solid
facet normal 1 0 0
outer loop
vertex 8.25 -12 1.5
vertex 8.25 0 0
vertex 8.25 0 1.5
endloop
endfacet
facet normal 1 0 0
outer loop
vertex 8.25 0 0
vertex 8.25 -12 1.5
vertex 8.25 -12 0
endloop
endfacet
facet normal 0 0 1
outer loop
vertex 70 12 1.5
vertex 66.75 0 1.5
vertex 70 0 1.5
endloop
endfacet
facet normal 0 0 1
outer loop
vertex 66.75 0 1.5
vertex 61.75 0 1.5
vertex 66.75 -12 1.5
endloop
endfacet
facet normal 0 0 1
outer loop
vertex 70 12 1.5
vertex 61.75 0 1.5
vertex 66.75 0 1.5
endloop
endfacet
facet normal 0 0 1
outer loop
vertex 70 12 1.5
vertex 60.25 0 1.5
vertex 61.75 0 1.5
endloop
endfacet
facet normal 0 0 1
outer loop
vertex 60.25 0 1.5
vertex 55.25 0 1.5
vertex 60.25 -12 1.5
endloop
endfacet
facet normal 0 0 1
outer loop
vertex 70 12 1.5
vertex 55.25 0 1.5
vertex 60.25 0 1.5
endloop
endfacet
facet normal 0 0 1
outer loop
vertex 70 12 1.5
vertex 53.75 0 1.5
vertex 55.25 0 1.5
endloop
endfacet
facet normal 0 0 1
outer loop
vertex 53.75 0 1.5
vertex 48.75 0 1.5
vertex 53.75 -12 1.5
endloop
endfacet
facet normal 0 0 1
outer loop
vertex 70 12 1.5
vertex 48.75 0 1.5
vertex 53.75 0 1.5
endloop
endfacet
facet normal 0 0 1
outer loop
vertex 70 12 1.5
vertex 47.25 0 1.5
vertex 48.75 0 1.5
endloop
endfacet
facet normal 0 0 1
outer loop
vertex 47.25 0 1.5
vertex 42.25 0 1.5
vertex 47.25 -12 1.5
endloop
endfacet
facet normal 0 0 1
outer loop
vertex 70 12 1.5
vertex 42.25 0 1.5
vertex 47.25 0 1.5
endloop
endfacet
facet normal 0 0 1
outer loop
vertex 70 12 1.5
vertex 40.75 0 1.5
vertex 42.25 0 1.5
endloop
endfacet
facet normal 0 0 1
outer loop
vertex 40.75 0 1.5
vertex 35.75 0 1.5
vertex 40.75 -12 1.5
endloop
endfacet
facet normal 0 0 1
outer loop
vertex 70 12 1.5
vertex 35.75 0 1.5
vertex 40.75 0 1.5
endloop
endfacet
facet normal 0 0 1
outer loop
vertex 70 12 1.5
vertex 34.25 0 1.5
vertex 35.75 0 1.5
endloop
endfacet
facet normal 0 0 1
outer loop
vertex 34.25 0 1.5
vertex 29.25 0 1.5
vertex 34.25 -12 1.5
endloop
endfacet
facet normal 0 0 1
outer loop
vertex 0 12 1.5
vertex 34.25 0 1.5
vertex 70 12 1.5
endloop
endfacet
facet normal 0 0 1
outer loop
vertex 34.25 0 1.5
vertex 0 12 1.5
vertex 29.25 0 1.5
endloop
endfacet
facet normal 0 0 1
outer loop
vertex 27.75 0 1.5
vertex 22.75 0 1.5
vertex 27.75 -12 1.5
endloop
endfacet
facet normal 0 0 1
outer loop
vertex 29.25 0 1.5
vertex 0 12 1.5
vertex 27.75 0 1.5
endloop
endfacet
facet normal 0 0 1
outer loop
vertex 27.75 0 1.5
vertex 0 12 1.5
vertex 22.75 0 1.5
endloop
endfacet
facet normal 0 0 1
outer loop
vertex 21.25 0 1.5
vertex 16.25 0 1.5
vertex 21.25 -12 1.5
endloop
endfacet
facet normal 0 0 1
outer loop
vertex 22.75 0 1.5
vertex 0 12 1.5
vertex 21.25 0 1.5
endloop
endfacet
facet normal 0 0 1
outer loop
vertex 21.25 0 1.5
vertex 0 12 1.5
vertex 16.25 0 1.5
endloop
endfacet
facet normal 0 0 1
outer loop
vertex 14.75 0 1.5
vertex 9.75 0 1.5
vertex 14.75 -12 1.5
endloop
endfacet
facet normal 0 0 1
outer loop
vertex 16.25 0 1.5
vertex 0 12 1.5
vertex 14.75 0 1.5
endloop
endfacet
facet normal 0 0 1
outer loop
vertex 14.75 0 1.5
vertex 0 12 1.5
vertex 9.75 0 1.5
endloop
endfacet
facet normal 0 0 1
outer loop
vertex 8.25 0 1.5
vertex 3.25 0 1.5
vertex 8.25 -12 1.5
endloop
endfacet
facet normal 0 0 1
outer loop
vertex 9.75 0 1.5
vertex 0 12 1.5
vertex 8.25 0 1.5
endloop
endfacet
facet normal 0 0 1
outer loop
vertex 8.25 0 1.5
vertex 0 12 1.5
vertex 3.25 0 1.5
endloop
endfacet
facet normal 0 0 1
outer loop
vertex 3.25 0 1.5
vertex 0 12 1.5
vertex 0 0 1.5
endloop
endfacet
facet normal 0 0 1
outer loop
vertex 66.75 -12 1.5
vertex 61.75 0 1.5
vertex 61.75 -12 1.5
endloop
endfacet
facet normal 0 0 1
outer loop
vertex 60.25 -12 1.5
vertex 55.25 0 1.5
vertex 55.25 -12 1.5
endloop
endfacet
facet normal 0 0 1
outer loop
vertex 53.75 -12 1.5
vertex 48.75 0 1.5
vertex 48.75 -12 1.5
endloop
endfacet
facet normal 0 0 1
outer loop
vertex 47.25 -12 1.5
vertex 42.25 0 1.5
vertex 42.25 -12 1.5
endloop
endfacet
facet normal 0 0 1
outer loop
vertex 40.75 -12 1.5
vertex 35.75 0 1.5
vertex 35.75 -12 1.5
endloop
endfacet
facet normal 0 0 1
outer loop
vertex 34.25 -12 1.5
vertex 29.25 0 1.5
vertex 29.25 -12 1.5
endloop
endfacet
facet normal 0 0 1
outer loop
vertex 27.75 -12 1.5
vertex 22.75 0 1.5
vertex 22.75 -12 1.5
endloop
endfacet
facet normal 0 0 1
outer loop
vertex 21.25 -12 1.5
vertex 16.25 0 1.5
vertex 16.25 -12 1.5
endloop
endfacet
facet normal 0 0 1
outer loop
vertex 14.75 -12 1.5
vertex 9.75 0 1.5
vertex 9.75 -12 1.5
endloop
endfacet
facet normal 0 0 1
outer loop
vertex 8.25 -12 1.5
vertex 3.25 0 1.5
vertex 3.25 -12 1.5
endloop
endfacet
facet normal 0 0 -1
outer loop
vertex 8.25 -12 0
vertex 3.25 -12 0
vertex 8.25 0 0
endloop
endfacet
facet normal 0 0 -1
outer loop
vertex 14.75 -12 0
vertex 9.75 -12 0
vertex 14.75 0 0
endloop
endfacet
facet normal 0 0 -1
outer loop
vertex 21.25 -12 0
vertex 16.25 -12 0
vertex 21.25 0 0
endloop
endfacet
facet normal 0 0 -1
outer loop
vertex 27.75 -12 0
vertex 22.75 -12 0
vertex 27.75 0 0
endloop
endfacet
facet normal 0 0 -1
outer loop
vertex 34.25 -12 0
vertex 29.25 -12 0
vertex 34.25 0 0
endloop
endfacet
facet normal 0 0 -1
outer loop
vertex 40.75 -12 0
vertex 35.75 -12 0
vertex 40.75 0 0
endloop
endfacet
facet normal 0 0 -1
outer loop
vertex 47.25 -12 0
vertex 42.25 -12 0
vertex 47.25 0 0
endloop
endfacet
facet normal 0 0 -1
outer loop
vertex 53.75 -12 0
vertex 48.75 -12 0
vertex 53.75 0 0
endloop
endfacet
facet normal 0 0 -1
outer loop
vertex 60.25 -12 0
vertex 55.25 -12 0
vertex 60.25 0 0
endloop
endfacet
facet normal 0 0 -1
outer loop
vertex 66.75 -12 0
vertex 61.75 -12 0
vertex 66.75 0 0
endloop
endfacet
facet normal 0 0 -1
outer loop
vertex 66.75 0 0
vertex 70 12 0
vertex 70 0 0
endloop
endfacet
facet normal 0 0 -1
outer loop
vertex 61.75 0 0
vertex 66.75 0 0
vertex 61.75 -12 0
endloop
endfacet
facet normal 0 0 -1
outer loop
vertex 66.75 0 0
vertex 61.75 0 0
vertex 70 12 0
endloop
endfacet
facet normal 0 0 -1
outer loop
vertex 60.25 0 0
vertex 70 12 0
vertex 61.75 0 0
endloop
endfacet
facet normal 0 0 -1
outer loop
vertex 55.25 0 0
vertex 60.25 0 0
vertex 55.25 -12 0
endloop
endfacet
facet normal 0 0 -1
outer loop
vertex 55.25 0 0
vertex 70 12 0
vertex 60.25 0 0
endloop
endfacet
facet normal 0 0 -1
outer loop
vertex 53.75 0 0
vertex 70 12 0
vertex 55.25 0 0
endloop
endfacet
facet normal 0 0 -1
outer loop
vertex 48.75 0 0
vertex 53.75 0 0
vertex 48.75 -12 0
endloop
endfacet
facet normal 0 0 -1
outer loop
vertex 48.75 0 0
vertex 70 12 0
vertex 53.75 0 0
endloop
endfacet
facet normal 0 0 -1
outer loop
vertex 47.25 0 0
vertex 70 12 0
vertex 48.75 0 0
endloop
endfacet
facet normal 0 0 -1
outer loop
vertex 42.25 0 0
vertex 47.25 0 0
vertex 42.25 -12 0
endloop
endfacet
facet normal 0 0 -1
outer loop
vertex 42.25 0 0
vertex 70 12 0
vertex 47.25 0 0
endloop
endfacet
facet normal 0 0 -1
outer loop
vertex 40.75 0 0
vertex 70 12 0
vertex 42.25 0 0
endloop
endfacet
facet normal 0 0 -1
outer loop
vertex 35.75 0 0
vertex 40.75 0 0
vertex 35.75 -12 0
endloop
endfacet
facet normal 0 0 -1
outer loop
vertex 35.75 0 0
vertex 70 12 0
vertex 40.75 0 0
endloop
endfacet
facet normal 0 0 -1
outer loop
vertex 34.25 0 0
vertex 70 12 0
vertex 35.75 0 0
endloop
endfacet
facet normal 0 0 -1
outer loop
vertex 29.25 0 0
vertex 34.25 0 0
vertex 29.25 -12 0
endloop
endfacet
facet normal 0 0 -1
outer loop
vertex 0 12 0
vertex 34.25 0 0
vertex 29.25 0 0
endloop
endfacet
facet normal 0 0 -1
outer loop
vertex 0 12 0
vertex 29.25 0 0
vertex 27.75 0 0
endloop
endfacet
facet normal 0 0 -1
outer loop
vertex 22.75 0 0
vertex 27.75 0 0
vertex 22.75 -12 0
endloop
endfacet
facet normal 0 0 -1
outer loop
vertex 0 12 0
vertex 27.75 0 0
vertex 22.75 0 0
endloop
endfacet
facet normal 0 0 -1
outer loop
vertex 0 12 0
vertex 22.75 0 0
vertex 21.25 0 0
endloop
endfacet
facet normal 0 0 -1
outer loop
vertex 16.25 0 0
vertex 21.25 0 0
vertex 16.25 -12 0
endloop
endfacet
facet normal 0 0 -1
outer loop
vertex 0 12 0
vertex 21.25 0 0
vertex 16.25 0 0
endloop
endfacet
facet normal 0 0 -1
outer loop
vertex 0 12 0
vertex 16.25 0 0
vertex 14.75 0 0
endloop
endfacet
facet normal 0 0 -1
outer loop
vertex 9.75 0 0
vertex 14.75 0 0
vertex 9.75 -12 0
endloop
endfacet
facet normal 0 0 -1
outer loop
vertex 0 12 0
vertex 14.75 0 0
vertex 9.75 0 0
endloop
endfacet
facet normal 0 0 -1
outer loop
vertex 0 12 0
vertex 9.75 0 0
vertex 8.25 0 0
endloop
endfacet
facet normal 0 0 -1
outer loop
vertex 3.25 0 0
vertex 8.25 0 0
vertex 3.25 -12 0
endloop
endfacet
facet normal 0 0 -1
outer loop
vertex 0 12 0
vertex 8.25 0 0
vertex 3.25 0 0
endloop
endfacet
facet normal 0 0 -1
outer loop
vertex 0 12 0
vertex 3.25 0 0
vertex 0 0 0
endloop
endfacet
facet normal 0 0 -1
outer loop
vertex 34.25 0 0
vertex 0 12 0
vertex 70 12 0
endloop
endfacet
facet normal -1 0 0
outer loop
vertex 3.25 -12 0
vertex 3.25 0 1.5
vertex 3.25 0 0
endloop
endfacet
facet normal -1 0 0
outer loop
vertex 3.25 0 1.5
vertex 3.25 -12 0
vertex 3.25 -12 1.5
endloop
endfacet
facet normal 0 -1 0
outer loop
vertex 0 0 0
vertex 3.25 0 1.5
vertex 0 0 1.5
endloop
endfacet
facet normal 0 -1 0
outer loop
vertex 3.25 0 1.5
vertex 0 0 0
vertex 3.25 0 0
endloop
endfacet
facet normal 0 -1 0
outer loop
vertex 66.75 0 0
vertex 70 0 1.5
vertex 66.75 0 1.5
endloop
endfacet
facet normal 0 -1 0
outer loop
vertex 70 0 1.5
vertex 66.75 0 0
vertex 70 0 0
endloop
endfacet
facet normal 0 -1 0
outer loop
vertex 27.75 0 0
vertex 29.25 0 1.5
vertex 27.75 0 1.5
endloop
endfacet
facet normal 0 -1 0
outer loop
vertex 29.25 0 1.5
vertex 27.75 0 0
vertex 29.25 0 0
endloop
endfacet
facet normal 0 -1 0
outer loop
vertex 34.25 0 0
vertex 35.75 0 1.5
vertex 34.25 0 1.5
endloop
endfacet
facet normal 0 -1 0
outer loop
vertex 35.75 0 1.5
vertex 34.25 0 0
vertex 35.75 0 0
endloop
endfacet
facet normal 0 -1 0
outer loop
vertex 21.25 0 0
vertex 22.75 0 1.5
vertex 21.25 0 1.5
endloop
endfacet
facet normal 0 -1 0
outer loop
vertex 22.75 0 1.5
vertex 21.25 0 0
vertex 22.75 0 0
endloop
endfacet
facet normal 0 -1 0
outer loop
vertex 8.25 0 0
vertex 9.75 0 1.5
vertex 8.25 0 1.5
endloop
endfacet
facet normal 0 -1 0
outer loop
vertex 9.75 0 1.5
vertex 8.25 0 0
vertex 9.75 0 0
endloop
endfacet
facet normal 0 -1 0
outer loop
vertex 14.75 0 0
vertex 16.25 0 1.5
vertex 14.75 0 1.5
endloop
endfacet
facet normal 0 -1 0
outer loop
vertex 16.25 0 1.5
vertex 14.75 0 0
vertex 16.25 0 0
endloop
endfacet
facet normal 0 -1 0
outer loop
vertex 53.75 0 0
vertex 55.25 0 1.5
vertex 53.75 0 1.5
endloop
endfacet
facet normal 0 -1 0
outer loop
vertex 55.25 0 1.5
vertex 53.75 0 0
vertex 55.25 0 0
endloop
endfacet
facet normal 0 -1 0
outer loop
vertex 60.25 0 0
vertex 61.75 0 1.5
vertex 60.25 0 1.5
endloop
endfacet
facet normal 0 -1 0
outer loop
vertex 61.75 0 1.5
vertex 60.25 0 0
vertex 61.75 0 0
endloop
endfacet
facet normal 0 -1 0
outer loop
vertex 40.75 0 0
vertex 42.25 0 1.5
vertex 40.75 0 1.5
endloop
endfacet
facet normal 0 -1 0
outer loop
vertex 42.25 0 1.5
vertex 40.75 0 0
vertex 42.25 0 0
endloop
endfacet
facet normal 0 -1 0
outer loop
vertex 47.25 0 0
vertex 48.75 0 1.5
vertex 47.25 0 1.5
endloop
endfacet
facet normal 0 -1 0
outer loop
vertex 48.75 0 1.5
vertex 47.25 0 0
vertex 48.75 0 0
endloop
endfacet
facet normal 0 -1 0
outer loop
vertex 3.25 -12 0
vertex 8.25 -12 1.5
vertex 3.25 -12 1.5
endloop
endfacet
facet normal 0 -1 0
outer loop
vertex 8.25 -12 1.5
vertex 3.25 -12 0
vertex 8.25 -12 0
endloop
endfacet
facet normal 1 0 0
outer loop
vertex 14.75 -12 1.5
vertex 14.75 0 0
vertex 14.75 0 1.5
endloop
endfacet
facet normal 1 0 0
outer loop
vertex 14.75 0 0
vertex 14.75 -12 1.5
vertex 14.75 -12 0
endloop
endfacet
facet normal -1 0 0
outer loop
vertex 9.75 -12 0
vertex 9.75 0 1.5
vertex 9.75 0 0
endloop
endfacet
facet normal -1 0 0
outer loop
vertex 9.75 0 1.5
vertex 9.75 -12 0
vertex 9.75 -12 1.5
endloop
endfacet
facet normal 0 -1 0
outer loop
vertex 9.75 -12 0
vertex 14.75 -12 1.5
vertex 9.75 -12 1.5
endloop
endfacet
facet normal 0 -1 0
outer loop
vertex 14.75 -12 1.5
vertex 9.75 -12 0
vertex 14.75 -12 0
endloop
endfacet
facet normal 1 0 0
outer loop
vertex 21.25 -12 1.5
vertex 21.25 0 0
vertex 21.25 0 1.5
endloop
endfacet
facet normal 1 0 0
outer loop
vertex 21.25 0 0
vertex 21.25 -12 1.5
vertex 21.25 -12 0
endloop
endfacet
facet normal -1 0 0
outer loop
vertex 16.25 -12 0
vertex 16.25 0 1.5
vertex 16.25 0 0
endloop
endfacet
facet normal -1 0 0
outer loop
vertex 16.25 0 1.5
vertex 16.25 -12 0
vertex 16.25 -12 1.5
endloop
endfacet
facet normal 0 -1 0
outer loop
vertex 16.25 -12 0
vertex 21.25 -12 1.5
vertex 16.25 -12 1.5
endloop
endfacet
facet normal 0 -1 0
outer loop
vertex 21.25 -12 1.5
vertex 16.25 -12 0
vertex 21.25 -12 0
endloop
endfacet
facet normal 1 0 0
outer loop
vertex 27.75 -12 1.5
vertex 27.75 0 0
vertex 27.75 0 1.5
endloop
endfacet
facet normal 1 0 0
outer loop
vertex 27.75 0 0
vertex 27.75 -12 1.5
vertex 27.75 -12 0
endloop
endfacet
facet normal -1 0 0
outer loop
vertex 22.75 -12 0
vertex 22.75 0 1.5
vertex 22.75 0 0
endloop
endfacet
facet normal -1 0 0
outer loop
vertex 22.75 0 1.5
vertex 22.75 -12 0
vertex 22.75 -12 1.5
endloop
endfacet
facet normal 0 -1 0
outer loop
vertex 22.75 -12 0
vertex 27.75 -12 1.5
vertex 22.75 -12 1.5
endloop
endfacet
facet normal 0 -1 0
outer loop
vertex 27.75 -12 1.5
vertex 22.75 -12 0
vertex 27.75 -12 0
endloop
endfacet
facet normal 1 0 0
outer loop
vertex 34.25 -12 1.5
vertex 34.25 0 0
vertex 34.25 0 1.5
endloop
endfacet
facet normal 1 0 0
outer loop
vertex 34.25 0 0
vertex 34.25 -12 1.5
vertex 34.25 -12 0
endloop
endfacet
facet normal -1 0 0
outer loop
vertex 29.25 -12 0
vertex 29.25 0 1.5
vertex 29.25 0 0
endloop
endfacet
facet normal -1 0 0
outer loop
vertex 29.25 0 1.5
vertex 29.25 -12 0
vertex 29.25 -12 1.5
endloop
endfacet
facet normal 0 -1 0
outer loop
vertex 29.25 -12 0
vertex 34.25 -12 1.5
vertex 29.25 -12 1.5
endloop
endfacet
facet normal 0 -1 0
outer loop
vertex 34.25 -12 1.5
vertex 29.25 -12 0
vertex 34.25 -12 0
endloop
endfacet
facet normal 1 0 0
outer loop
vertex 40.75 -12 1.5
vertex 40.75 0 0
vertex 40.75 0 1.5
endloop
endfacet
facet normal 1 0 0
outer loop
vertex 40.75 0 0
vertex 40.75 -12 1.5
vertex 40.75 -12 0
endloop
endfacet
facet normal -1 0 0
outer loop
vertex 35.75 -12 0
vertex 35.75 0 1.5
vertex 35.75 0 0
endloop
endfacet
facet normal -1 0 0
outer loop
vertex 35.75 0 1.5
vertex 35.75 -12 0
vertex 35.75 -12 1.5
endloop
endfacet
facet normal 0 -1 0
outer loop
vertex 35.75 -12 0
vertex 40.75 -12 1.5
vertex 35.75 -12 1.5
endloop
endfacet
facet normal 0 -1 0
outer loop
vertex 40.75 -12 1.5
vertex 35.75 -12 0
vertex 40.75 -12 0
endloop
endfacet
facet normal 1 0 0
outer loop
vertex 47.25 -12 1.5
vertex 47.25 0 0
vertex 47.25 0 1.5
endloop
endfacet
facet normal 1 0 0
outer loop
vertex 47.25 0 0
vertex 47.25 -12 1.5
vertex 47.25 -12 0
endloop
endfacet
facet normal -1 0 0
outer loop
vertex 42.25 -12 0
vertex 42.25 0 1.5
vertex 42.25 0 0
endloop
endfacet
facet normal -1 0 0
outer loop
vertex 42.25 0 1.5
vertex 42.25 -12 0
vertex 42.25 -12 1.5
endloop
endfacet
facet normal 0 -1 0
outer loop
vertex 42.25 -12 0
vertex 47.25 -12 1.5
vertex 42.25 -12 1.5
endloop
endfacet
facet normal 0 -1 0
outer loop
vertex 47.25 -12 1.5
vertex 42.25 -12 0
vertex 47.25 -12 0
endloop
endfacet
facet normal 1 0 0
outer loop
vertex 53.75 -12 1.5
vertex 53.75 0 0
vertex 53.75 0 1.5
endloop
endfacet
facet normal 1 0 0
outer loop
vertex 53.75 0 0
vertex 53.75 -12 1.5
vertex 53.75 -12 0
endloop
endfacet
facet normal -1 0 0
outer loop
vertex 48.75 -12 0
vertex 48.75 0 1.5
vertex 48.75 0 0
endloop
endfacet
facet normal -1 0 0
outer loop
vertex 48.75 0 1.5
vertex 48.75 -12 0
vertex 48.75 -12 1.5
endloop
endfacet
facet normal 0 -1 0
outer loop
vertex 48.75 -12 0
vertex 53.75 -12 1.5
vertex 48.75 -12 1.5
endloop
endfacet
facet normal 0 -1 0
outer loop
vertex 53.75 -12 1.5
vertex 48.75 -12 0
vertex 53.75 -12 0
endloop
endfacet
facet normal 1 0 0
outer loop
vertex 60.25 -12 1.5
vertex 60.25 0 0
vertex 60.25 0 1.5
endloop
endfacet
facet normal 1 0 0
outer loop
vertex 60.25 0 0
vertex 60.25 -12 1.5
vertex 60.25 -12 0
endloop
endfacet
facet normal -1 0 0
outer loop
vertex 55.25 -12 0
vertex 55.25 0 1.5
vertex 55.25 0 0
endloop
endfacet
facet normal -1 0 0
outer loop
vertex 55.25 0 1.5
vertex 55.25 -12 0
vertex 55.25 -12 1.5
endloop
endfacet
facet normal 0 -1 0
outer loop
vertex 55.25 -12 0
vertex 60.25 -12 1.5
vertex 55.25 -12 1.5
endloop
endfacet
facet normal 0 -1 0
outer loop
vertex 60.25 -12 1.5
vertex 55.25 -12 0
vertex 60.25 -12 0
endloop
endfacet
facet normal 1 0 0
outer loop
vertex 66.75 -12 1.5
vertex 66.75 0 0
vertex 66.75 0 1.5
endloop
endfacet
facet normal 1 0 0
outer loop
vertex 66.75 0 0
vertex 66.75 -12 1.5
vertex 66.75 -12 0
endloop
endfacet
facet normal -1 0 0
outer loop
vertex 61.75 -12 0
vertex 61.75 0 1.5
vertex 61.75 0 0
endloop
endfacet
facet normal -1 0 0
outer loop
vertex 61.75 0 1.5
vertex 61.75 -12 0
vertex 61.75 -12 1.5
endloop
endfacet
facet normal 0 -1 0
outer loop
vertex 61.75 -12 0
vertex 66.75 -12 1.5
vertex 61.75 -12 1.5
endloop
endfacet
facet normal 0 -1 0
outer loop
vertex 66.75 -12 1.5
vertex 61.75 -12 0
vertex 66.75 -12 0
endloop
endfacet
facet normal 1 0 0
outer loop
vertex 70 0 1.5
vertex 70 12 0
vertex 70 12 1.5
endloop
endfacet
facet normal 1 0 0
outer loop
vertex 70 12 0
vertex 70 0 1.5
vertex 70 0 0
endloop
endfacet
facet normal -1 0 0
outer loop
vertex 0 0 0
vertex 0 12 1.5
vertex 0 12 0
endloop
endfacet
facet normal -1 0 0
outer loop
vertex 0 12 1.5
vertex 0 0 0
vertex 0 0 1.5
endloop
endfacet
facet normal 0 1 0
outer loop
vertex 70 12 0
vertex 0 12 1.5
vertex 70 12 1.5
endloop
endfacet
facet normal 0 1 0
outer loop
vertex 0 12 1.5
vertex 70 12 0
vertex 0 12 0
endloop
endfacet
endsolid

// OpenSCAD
// 10-well comb for casting agarose gels
// Print orientation: lying flat on XY plane, z=0

// Overall plate thickness (Z)
plate_thickness = 1.5;

// Spine (back bar) dimensions
spine_length = 70;    // X
spine_width = 12;     // Y

// Tooth dimensions
tooth_width = 5.0;    // X
tooth_length = 12;    // Y (extends in -Y from spine edge)

// Gap between teeth
gap_width = 1.5;

// Number of teeth
num_teeth = 10;

// Calculate total width of teeth + gaps
total_tooth_width = num_teeth * tooth_width;
total_gap_width = (num_teeth - 1) * gap_width;
total_pattern_width = total_tooth_width + total_gap_width;

// Center the pattern on the spine
offset_x = (spine_length - total_pattern_width) / 2;

// Spine edge where teeth attach (at y = 0, teeth extend in -Y)
spine_y_start = 0;

// Build the comb
difference() {
    // Main spine plate
    union() {
        // Spine base
        translate([0, 0, 0])
            cube([spine_length, spine_width, plate_thickness], center = false);
        
        // Teeth extending in -Y direction
        for (i = [0 : num_teeth - 1]) {
            tooth_x = offset_x + i * (tooth_width + gap_width);
            translate([tooth_x, -tooth_length, 0])
                cube([tooth_width, tooth_length, plate_thickness], center = false);
        }
    }
    
    // No cutting needed - this is a solid comb
}
